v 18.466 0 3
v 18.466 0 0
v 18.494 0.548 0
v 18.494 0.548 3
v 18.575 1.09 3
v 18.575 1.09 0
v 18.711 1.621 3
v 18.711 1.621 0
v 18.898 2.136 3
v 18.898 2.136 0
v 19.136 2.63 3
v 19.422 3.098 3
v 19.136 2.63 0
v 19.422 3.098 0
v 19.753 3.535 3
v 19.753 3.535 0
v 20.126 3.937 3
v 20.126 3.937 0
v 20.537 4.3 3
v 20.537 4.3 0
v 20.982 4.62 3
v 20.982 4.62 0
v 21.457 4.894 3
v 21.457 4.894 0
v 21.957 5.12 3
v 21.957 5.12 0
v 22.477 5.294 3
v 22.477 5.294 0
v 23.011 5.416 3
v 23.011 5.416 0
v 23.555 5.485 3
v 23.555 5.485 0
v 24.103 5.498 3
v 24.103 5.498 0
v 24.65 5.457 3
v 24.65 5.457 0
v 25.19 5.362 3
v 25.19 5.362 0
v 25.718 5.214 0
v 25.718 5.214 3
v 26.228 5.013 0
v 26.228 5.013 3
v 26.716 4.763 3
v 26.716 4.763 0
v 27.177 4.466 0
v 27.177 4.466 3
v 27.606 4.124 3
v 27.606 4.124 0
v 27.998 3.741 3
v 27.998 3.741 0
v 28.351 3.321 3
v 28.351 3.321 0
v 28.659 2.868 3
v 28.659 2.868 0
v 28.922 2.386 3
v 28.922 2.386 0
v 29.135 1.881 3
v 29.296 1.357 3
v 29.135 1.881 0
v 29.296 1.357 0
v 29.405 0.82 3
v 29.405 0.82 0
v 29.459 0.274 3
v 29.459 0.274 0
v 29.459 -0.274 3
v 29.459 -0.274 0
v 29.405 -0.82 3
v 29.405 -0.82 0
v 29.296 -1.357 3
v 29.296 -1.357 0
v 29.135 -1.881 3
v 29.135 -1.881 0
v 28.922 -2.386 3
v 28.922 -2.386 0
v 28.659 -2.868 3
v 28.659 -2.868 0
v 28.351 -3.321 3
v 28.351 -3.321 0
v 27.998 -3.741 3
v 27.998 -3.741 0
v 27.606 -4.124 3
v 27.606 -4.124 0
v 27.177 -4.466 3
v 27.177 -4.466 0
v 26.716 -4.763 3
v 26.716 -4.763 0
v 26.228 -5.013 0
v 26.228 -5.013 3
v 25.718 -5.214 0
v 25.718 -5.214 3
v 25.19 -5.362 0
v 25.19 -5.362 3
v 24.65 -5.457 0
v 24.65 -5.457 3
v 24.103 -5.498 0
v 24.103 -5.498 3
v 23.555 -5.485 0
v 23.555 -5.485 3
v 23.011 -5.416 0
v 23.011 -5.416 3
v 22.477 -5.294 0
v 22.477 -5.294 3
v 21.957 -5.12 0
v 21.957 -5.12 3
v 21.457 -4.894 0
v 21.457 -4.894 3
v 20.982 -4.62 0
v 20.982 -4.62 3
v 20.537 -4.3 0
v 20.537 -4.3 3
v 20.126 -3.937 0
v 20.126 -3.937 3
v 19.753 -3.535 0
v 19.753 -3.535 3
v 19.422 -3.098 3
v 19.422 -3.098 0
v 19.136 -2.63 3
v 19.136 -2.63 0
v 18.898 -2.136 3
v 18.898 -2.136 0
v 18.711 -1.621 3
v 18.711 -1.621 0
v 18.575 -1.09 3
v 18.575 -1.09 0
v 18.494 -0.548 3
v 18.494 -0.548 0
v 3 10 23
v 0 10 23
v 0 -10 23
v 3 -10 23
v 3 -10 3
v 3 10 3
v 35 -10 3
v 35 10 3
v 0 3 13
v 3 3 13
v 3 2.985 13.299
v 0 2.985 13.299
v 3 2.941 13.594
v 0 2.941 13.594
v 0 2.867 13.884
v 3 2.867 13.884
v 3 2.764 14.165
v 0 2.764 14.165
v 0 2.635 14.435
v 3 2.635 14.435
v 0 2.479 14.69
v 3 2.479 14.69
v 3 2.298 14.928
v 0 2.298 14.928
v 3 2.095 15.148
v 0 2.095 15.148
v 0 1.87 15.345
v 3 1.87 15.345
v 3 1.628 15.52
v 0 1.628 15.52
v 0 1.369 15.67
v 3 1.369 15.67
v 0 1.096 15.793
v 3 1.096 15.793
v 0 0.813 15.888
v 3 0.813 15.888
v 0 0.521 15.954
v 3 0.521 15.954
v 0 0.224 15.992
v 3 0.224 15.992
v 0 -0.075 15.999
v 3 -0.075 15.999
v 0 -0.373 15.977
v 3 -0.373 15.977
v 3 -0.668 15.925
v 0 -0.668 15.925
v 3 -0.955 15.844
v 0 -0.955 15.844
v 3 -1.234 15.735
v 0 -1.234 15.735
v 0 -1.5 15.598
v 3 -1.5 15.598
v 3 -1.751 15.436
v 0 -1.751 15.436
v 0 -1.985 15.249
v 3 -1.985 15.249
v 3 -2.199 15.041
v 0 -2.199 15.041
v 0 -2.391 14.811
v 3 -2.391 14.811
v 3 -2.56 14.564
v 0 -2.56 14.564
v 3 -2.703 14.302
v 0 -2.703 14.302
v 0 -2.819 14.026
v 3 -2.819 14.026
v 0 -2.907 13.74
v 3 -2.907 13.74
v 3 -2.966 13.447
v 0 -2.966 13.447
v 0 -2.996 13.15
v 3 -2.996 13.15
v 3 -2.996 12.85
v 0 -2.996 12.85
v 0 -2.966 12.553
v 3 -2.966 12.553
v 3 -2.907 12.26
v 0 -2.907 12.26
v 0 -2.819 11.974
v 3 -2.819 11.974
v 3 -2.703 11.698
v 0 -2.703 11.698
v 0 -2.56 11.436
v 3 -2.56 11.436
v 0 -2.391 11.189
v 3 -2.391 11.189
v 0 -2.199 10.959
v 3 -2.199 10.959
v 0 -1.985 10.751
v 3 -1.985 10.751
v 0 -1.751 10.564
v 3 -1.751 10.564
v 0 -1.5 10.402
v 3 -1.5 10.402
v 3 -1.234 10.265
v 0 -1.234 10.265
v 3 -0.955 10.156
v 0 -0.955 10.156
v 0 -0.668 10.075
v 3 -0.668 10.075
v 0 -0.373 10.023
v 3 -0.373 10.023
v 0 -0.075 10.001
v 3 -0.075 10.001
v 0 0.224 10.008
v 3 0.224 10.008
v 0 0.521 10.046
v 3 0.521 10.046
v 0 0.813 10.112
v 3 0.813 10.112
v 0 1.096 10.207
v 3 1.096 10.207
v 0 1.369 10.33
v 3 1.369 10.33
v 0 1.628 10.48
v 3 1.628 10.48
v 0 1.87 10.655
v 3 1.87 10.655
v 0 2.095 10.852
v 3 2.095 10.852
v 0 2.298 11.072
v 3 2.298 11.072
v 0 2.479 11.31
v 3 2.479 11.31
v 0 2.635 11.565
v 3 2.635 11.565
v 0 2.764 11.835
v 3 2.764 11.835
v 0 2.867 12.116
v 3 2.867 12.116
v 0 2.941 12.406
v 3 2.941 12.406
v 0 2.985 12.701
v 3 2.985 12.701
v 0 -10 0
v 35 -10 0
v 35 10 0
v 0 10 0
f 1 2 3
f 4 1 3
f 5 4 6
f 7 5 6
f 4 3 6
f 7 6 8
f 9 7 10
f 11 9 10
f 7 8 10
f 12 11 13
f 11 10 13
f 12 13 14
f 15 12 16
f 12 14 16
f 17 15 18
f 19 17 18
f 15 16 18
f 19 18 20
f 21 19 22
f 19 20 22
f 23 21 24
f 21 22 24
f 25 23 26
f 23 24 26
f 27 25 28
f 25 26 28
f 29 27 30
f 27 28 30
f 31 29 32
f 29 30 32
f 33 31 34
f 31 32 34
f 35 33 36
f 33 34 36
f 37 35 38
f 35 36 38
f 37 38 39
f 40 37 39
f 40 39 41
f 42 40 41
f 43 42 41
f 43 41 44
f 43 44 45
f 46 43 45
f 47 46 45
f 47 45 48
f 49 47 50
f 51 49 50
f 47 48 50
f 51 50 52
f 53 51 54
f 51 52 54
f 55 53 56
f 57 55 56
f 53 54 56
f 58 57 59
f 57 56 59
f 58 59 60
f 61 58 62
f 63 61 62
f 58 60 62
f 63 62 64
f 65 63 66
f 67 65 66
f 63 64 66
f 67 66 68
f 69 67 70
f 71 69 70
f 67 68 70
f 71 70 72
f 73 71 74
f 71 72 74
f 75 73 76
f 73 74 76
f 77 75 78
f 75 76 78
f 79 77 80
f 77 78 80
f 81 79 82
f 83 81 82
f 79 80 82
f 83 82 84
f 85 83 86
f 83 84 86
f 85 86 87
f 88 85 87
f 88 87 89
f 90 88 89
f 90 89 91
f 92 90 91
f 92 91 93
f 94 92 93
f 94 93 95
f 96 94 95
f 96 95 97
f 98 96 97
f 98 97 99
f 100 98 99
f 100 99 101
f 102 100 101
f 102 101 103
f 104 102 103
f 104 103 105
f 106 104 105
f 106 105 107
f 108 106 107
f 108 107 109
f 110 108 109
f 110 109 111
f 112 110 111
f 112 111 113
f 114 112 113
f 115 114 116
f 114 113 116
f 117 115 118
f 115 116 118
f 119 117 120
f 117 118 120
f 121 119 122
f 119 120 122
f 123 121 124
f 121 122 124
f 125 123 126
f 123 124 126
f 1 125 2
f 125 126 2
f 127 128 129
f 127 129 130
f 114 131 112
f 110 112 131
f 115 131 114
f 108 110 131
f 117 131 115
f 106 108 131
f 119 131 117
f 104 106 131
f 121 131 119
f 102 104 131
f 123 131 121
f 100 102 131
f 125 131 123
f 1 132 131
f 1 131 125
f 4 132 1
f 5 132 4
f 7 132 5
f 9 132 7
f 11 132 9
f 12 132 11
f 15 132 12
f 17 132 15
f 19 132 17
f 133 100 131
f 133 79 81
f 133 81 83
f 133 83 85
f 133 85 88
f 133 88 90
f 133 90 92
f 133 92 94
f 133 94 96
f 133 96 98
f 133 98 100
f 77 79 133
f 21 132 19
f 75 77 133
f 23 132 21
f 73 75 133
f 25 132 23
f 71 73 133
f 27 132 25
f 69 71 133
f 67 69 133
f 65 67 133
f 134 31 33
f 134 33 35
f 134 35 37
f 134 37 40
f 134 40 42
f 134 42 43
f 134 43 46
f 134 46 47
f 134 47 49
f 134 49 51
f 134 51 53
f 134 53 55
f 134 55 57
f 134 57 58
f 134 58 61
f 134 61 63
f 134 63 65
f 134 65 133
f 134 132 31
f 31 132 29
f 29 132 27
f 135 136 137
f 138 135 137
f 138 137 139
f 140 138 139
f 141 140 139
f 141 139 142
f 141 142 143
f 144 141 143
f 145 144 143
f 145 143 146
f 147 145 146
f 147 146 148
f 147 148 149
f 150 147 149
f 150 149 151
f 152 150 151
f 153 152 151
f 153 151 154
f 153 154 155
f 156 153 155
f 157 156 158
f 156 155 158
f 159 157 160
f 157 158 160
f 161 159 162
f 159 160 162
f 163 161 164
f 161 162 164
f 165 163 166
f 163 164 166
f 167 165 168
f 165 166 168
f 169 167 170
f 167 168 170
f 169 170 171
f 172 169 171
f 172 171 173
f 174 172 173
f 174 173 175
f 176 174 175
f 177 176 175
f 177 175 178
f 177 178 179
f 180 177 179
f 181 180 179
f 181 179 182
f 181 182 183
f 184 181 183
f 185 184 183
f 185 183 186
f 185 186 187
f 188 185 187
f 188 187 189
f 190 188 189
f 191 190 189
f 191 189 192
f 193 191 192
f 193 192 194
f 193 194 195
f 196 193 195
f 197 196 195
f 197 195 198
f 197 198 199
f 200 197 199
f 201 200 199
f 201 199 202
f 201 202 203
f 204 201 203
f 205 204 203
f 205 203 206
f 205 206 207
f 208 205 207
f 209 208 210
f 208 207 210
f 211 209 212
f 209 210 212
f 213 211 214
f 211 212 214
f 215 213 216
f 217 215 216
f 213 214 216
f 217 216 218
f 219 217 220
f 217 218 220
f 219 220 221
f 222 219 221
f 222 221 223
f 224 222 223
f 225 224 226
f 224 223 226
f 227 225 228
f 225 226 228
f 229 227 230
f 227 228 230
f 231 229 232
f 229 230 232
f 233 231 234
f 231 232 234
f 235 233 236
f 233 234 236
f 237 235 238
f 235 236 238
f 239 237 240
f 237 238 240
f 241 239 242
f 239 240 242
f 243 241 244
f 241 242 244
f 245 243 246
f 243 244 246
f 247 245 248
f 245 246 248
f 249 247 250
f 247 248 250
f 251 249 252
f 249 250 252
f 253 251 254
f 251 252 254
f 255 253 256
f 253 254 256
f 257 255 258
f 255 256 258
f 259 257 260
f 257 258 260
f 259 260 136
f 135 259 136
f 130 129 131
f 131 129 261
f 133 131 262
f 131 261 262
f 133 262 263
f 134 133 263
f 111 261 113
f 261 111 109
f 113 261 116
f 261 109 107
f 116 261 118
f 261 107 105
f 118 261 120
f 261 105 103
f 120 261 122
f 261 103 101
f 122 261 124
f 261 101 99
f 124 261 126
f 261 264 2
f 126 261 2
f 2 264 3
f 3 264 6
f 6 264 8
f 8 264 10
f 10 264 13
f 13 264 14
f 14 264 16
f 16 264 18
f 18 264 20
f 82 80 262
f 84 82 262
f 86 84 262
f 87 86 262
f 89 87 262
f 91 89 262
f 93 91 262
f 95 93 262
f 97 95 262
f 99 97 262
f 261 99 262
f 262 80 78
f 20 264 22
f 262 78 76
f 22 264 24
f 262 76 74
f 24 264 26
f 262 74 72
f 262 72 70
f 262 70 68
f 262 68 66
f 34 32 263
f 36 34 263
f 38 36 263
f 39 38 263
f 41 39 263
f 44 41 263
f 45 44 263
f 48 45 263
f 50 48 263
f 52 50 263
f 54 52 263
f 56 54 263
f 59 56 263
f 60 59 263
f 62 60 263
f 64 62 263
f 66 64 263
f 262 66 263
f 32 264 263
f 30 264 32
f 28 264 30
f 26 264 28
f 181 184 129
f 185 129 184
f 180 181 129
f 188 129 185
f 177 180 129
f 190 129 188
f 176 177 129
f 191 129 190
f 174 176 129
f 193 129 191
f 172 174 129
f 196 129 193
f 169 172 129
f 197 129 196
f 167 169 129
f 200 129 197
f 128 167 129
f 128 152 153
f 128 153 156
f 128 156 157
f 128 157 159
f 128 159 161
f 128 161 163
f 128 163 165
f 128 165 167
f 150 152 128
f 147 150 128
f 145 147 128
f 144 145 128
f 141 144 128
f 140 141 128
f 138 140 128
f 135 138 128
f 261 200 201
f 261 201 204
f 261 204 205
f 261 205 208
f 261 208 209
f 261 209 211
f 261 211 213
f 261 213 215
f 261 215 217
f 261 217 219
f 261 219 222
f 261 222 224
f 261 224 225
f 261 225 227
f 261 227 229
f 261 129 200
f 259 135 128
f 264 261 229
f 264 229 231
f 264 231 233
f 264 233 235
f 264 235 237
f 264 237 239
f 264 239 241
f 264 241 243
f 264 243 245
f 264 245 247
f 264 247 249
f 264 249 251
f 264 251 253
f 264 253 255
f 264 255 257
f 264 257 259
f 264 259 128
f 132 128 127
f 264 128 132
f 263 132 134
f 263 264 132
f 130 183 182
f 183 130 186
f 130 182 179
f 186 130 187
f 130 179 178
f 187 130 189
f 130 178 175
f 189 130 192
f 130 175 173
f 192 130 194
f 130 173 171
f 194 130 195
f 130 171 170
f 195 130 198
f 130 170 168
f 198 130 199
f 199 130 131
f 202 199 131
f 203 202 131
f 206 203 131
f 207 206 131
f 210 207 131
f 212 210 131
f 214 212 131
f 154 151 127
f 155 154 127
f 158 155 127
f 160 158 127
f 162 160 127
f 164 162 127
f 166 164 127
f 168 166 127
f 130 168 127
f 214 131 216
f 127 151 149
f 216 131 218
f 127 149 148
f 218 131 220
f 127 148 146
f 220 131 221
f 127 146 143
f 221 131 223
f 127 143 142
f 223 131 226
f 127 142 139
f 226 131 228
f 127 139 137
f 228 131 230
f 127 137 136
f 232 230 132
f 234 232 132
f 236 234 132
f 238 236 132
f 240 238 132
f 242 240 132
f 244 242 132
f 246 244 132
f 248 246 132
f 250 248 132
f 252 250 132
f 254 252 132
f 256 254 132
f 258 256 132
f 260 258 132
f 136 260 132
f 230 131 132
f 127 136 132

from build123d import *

# Parameters (mm, degrees)
F1_DEPTH = 3
F2_W     = 3
F2_H     = 20
F3_DEPTH = 20
F4_R     = 3
F5_DEPTH = 3.001


with BuildPart() as f1:
    # F0 (on Top) → F1 (new body)
    with BuildSketch(Plane.XY):
        Polygon((0, 10), (0, 0), (0, -10), (35, -10), (35, 0), (35, 10), align=None)
        with BuildLine():
            ThreePointArc((29.466326, 0), (23.966326, -5.5), (18.466326, 0))
            ThreePointArc((18.466326, 0), (23.966326, 5.5), (29.466326, 0))
        make_face(mode=Mode.SUBTRACT)
    extrude(amount=F1_DEPTH)

    # F2 (on face) → F3 (join)
    with BuildSketch(Plane.XY.offset(3)):
        with Locations((1.5, 0)):
            Rectangle(F2_W, F2_H)
    extrude(amount=F3_DEPTH)

    # F4 (on face) → F5 (cut, through all)
    with BuildSketch(Plane.YZ.offset(3)):
        with Locations((0, 13)):
            Circle(F4_R)
    extrude(amount=-F5_DEPTH, mode=Mode.SUBTRACT)


solid = f1.part
